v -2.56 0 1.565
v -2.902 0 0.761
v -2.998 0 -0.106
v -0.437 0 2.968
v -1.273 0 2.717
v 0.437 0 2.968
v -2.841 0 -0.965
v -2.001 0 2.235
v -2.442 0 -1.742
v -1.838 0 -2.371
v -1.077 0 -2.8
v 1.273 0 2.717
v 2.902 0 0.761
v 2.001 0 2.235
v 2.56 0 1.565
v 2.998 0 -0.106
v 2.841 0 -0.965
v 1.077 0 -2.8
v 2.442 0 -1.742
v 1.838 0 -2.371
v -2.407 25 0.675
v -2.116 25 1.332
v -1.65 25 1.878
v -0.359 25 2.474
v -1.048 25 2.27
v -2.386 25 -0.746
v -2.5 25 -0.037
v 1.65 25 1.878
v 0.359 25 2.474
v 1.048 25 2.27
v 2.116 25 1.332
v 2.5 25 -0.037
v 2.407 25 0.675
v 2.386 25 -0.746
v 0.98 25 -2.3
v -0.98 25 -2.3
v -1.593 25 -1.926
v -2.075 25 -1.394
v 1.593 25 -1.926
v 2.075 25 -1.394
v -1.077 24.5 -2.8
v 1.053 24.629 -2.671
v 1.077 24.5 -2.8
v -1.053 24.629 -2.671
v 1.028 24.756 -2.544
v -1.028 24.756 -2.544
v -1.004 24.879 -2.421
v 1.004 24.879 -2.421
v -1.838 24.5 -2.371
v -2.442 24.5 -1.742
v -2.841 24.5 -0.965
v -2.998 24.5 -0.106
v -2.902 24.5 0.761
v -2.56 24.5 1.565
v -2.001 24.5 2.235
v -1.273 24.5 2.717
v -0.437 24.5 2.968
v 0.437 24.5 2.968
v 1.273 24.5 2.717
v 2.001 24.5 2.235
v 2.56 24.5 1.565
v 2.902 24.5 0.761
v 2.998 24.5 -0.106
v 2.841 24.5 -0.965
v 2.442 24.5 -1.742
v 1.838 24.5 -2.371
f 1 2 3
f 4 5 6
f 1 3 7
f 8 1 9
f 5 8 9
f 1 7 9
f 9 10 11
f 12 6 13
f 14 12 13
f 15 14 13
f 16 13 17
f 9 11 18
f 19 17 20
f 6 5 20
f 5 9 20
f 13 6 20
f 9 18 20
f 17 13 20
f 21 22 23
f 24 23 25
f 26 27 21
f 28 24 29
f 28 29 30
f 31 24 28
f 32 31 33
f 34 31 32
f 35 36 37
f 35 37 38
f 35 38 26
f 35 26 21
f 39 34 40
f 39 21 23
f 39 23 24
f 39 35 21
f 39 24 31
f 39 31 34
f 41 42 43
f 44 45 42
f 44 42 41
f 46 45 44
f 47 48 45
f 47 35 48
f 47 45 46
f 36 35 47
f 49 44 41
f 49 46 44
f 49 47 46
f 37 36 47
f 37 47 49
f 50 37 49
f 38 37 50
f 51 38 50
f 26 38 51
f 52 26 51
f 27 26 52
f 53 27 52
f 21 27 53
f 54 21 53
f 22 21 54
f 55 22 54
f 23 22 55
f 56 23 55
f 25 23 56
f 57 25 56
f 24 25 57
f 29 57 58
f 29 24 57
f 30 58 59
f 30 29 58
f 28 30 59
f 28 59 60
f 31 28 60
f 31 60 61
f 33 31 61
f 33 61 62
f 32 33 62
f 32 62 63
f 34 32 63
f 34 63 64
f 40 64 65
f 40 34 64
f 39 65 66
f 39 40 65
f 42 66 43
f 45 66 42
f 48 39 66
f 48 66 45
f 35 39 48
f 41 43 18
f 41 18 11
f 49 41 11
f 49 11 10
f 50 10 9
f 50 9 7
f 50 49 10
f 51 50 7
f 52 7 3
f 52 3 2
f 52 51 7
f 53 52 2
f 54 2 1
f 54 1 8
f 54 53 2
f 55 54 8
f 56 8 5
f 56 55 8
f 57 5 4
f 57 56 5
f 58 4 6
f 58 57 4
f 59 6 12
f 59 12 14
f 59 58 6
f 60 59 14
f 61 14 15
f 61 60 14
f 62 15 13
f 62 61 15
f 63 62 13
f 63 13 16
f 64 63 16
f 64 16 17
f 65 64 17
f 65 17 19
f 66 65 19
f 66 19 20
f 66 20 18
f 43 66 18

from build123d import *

# Parameters (mm, degrees)
BOSS_EXTRUDE1_DEPTH   = 25
CHAMFER1_SIZE2        = 0.500023177
CHAMFER1_SIZE         = 0.500027299
CHAMFER1_EDGE_2_SIZE2 = 0.500023177
CHAMFER1_EDGE_2_SIZE  = 0.500027299


with BuildPart() as part:
    # Sketch1 → Boss-Extrude1 (new body)
    with BuildSketch(Plane(origin=(0, 25, 0), x_dir=(1, 0, 0), z_dir=(0, 1, 0))):
        with BuildLine():
            Line((1.077032961, 2.8), (-1.077032961, 2.8))
            ThreePointArc((-1.077032961, 2.8), (0, -3), (1.077032961, 2.8))
        make_face()
    extrude(amount=-BOSS_EXTRUDE1_DEPTH)

    # Chamfer1
    chamfer1_edges = [part.edges().sort_by_distance(p)[0] for p in [
        (0, 25, -2.8),
    ]]
    chamfer(chamfer1_edges, length=CHAMFER1_SIZE, length2=CHAMFER1_SIZE2)

    # Chamfer1 edge 2
    chamfer1_edge_2_edges = [part.edges().sort_by_distance(p)[0] for p in [
        (0, 25, 3),
    ]]
    chamfer(chamfer1_edge_2_edges, length=CHAMFER1_EDGE_2_SIZE, length2=CHAMFER1_EDGE_2_SIZE2)


solid = part.part
